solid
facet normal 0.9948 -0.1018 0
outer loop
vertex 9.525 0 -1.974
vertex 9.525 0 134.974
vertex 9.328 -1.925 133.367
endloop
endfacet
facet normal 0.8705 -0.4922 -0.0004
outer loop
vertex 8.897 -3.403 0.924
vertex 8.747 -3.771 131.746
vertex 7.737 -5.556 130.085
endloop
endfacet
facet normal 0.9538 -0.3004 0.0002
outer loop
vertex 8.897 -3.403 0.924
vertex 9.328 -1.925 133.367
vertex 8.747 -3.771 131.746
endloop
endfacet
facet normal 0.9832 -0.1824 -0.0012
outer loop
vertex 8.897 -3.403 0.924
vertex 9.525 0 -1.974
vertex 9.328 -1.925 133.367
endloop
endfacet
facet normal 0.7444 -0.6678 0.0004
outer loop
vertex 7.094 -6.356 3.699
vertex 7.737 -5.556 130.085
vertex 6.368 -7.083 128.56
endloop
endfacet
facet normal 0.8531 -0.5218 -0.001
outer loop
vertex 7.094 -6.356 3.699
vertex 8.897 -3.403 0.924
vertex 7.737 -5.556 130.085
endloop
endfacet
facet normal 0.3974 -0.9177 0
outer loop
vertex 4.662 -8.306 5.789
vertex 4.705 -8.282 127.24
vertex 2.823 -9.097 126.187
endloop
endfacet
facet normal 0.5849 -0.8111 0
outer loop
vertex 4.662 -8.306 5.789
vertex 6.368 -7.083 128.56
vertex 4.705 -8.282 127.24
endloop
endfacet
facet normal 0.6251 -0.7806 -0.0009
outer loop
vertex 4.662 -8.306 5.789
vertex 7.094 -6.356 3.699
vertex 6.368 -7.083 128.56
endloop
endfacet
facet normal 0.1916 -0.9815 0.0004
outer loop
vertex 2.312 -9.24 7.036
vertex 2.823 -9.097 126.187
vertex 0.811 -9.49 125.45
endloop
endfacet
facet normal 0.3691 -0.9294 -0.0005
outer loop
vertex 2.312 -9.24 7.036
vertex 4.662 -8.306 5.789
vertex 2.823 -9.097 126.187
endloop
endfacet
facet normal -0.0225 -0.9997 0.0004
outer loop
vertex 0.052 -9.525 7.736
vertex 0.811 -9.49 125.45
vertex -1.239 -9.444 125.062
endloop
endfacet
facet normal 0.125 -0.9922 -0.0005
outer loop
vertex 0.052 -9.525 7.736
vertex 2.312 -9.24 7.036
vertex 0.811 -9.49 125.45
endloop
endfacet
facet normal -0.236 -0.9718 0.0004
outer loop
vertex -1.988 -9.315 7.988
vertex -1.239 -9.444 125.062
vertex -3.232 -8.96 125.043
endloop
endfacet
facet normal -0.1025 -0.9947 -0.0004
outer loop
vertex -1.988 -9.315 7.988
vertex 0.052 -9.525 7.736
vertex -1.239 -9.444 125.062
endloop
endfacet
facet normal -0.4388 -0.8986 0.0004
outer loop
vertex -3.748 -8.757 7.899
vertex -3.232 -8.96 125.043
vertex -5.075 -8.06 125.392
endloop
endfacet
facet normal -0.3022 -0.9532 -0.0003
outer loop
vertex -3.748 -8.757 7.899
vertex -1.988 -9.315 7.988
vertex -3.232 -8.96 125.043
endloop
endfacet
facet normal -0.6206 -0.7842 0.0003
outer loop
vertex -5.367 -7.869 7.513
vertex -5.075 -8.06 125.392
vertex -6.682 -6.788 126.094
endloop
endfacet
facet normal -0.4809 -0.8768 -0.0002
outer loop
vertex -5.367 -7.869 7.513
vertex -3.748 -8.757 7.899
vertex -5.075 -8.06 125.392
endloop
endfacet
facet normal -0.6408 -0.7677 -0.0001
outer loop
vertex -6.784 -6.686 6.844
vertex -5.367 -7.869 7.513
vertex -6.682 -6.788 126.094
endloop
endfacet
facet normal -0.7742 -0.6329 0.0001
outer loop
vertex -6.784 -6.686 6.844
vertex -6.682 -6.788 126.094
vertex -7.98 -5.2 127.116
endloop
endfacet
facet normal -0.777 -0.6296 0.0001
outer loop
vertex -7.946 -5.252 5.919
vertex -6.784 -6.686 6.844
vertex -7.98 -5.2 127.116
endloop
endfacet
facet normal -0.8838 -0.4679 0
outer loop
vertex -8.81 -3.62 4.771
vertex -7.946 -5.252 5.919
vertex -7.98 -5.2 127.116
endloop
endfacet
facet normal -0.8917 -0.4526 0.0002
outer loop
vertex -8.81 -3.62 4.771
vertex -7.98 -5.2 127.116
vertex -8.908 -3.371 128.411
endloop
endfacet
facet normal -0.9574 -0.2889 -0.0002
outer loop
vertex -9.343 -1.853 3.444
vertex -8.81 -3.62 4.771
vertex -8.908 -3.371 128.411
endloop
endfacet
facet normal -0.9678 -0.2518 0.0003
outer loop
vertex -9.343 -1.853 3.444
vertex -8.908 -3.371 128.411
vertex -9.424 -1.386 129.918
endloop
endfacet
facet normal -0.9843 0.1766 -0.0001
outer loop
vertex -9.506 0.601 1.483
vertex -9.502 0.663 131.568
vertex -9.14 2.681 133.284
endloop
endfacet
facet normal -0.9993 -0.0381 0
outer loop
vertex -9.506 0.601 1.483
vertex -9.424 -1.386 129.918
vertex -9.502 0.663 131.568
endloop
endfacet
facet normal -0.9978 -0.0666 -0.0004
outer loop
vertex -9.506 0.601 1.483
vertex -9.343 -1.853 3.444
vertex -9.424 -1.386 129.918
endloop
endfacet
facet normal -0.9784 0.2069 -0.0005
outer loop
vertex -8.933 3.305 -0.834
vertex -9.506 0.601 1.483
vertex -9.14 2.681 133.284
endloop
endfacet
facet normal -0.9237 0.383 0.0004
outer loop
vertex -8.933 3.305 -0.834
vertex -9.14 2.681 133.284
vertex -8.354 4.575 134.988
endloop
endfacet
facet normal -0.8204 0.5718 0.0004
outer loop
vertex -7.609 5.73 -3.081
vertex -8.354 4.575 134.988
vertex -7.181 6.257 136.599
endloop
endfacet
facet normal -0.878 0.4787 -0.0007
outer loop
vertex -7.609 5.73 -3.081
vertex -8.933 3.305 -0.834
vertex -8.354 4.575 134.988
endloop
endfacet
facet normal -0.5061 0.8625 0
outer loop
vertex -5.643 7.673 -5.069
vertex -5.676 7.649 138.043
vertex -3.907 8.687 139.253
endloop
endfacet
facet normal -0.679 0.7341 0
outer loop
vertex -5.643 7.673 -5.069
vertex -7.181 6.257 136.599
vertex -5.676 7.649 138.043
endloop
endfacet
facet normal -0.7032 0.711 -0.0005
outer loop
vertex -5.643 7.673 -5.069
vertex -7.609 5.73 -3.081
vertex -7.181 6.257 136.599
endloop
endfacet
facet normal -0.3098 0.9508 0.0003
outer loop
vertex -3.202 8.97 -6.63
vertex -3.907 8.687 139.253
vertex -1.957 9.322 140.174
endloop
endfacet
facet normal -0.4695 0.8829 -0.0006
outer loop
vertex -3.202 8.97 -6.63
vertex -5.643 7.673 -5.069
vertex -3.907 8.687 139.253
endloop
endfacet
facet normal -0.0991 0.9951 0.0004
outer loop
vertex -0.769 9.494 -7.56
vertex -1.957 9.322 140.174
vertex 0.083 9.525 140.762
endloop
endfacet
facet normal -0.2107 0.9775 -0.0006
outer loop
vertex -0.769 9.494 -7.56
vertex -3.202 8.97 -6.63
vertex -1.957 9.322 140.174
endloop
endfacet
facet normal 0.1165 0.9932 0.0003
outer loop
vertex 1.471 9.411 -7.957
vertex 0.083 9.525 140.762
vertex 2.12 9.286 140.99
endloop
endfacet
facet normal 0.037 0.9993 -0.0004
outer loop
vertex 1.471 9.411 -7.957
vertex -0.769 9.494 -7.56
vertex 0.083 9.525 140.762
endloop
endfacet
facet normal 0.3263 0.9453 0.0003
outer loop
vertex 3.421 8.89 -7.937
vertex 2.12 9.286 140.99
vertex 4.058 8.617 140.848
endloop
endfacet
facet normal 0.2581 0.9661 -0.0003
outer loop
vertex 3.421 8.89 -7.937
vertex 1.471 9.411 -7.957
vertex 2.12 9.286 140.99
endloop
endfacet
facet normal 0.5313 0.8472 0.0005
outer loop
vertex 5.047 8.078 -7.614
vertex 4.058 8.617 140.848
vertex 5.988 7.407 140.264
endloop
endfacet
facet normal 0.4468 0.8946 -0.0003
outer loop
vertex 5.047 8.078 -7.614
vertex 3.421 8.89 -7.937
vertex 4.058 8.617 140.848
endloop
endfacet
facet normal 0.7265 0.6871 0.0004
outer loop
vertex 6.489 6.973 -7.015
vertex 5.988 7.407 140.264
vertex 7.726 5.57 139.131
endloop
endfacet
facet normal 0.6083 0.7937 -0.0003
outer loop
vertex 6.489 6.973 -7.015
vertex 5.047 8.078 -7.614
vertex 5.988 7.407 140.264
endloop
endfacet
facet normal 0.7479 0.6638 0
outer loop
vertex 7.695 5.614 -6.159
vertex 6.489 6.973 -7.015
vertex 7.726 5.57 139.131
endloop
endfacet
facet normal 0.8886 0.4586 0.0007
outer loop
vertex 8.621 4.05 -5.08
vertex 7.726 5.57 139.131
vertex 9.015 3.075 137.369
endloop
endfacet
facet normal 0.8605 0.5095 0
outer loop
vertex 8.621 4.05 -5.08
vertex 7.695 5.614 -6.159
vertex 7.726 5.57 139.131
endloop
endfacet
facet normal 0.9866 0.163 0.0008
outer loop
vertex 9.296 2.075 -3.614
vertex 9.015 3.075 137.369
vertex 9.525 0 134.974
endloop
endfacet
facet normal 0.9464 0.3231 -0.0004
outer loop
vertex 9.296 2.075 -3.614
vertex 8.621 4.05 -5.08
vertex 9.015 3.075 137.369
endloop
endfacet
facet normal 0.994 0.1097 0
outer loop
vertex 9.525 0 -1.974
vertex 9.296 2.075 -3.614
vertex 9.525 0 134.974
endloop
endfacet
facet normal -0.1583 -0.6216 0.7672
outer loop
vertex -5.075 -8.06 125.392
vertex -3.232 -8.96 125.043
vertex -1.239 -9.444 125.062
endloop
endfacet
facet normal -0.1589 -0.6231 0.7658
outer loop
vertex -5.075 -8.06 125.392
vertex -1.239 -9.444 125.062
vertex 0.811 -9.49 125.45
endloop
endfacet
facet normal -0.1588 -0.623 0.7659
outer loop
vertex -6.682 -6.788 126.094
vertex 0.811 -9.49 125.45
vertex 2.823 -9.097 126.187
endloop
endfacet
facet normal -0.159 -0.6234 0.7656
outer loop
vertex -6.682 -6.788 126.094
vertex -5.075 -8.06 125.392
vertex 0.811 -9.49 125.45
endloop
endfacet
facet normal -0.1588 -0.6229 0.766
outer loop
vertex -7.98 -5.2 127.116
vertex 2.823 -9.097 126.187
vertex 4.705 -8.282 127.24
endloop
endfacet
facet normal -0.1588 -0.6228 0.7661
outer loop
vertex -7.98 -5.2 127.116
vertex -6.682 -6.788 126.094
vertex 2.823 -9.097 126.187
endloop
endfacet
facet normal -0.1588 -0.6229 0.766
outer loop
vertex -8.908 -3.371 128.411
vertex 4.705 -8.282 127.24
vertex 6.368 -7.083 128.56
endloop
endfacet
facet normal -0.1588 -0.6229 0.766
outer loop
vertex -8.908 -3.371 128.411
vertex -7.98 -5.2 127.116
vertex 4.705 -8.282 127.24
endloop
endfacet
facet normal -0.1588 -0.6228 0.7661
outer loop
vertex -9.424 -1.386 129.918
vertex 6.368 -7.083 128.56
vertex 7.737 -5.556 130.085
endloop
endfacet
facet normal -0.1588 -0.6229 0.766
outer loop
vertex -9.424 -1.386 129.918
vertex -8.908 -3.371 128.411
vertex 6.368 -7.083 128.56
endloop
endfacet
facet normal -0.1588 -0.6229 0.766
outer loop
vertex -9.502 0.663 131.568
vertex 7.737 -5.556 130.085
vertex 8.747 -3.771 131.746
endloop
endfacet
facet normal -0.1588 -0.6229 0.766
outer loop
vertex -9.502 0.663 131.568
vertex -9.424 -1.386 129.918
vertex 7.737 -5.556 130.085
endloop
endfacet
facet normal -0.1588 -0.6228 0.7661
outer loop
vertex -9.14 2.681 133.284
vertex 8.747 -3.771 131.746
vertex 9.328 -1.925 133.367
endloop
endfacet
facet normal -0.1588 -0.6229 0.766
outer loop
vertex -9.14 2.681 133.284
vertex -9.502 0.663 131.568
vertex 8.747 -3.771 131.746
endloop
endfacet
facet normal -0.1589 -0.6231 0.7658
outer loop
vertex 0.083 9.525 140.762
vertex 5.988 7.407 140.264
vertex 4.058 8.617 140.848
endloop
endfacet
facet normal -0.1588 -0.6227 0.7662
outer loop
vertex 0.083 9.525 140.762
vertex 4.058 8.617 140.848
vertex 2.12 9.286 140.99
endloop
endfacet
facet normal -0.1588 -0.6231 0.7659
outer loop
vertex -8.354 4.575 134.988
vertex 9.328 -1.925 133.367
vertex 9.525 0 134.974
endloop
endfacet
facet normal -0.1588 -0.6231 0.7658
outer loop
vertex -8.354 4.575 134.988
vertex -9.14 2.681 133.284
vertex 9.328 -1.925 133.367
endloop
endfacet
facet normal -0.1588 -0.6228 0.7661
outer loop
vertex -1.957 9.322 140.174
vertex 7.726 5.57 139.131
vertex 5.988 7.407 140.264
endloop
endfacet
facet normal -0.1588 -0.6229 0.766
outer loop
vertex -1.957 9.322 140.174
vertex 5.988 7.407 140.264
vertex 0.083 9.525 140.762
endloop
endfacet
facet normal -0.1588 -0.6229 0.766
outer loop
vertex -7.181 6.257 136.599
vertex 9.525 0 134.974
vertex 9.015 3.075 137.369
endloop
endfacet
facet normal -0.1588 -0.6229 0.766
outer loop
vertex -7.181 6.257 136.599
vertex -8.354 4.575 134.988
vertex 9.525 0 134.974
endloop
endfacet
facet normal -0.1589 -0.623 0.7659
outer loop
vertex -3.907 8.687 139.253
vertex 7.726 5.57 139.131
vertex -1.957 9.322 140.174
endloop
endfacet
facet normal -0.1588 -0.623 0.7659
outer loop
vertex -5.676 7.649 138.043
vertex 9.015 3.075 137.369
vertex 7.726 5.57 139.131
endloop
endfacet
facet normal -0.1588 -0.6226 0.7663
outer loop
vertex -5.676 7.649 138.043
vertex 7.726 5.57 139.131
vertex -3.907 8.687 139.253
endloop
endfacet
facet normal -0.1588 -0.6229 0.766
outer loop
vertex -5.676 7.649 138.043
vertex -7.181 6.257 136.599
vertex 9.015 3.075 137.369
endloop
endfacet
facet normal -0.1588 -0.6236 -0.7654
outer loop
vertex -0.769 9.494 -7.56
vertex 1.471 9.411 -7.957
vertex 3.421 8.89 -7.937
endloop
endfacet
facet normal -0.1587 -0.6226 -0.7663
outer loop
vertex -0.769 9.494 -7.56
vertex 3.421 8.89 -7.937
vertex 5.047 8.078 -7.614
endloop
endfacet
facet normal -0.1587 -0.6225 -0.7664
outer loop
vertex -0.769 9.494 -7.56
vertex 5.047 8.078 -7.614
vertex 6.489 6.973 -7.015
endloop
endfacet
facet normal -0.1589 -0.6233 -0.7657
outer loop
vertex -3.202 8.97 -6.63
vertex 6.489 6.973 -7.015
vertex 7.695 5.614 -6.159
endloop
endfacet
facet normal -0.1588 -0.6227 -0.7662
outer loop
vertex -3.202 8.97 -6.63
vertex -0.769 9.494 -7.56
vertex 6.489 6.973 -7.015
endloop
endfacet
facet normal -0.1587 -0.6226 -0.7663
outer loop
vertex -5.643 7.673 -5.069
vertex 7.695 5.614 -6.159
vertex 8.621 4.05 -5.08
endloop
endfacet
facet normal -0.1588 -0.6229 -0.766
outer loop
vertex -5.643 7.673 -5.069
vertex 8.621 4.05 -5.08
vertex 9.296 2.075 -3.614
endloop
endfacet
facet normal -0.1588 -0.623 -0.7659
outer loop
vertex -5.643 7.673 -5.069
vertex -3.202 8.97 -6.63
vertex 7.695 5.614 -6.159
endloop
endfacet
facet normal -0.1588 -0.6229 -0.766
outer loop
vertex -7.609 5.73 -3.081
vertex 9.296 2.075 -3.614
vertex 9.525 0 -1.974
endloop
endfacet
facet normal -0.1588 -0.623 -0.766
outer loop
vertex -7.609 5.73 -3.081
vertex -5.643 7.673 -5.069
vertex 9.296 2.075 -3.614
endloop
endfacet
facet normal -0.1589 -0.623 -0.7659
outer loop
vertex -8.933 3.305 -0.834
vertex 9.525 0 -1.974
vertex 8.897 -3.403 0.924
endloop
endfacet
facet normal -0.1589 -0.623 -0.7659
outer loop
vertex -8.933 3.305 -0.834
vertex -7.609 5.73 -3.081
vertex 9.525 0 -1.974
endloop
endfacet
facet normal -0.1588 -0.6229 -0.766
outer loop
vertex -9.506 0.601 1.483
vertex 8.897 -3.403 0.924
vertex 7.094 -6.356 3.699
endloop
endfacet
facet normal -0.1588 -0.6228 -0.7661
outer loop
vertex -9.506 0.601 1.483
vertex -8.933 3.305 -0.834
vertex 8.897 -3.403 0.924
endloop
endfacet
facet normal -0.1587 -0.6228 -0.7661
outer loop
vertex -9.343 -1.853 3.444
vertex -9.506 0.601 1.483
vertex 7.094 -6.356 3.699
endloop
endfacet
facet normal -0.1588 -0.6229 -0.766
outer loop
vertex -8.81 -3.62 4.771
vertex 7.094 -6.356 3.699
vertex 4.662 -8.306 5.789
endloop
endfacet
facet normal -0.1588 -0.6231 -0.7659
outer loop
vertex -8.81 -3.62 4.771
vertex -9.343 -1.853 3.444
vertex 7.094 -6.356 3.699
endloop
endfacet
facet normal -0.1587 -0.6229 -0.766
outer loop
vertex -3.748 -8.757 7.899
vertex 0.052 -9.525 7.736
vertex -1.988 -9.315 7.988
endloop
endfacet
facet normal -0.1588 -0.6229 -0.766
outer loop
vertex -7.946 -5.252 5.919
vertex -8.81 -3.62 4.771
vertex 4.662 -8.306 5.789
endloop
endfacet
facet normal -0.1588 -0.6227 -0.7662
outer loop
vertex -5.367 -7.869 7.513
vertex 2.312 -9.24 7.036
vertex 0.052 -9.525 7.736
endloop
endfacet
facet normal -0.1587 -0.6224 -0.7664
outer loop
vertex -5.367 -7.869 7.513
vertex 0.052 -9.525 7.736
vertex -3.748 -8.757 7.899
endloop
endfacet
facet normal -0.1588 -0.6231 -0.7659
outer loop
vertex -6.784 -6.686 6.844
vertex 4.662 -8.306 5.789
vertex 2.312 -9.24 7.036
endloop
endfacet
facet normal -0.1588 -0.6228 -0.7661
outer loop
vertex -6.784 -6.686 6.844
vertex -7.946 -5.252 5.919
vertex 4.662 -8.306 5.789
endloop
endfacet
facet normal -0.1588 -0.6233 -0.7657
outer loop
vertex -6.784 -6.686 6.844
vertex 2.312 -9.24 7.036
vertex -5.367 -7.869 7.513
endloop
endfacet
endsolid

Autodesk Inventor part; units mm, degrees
ref_plane "Start Plane" through (0, 0, -9.7188) normal (0, 0, 1) x (1, 0, 0)
ref_plane "End Plane" through (0, 0, 142.7188) normal (0, 0, 1) x (1, 0, 0)
sketch "Sketch" plane through (0, 0, 0) normal (0, 0, 1) x (1, 0, 0)
  circle A0 centre (0, 0) radius 9.525
  dimension "d0" = 19.05
extrude "Body" add sketch "Sketch" along normal up to surface (152.4376 mm away) from surface at -9.7188
sketch "Sketch2" plane through (0, 0, 0) normal (0, 0, 1) x (1, 0, 0)
  line L0 (0, 0) -> (10, 0)
ref_plane "Work Plane3" through (0, 0, 0) normal (0, -1, 0) x (1, 0, 0)
ref_plane "Work Plane4" through (2.3525, 9.2299, -7.9924) normal (-0.1588, -0.6229, -0.766) x (0.8923, -0.4227, 0.1588)
split "Split1" plane through (2.3525, 9.2299, -7.9924) removes the side toward (-0.1588, -0.6229, -0.766)
ref_plane "Work Plane5" through (2.3525, 9.2299, 140.9924) normal (-0.1588, -0.6229, 0.766) x (0.9857, -0.056, 0.1588)
split "Split2" plane through (2.3525, 9.2299, 140.9924) removes the side toward (-0.1588, -0.6229, 0.766)
sketch "Sketch3" plane through (0, 0, 0) normal (0, -1, 0) x (1, 0, 0)
  line L0 (-2, -9.7188) -> (12, -9.7188) projected
  line L1 (-2, 142.7188) -> (12, 142.7188) projected
  dimension "d7" = 152.4376
equation "\"d0\" = Diam"
equation "\"d1\" = G_L"
equation "\"Diam\" = 19.05"
equation "\"G_L\" = 148.98485"
equation "\"G_OFFSET_START\" = 9.71882"
equation "\"G_OFFSET_END\" = 9.71882"
equation "\"d4\" = -G_OFFSET_START"
equation "\"d5\" = G_OFFSET_END + B_L"
equation "\"B_L\" = 133"
properties part number "ANSI/AISC Rolled Steel - 3/4-5.866, RB" material "Steel, Mild"
